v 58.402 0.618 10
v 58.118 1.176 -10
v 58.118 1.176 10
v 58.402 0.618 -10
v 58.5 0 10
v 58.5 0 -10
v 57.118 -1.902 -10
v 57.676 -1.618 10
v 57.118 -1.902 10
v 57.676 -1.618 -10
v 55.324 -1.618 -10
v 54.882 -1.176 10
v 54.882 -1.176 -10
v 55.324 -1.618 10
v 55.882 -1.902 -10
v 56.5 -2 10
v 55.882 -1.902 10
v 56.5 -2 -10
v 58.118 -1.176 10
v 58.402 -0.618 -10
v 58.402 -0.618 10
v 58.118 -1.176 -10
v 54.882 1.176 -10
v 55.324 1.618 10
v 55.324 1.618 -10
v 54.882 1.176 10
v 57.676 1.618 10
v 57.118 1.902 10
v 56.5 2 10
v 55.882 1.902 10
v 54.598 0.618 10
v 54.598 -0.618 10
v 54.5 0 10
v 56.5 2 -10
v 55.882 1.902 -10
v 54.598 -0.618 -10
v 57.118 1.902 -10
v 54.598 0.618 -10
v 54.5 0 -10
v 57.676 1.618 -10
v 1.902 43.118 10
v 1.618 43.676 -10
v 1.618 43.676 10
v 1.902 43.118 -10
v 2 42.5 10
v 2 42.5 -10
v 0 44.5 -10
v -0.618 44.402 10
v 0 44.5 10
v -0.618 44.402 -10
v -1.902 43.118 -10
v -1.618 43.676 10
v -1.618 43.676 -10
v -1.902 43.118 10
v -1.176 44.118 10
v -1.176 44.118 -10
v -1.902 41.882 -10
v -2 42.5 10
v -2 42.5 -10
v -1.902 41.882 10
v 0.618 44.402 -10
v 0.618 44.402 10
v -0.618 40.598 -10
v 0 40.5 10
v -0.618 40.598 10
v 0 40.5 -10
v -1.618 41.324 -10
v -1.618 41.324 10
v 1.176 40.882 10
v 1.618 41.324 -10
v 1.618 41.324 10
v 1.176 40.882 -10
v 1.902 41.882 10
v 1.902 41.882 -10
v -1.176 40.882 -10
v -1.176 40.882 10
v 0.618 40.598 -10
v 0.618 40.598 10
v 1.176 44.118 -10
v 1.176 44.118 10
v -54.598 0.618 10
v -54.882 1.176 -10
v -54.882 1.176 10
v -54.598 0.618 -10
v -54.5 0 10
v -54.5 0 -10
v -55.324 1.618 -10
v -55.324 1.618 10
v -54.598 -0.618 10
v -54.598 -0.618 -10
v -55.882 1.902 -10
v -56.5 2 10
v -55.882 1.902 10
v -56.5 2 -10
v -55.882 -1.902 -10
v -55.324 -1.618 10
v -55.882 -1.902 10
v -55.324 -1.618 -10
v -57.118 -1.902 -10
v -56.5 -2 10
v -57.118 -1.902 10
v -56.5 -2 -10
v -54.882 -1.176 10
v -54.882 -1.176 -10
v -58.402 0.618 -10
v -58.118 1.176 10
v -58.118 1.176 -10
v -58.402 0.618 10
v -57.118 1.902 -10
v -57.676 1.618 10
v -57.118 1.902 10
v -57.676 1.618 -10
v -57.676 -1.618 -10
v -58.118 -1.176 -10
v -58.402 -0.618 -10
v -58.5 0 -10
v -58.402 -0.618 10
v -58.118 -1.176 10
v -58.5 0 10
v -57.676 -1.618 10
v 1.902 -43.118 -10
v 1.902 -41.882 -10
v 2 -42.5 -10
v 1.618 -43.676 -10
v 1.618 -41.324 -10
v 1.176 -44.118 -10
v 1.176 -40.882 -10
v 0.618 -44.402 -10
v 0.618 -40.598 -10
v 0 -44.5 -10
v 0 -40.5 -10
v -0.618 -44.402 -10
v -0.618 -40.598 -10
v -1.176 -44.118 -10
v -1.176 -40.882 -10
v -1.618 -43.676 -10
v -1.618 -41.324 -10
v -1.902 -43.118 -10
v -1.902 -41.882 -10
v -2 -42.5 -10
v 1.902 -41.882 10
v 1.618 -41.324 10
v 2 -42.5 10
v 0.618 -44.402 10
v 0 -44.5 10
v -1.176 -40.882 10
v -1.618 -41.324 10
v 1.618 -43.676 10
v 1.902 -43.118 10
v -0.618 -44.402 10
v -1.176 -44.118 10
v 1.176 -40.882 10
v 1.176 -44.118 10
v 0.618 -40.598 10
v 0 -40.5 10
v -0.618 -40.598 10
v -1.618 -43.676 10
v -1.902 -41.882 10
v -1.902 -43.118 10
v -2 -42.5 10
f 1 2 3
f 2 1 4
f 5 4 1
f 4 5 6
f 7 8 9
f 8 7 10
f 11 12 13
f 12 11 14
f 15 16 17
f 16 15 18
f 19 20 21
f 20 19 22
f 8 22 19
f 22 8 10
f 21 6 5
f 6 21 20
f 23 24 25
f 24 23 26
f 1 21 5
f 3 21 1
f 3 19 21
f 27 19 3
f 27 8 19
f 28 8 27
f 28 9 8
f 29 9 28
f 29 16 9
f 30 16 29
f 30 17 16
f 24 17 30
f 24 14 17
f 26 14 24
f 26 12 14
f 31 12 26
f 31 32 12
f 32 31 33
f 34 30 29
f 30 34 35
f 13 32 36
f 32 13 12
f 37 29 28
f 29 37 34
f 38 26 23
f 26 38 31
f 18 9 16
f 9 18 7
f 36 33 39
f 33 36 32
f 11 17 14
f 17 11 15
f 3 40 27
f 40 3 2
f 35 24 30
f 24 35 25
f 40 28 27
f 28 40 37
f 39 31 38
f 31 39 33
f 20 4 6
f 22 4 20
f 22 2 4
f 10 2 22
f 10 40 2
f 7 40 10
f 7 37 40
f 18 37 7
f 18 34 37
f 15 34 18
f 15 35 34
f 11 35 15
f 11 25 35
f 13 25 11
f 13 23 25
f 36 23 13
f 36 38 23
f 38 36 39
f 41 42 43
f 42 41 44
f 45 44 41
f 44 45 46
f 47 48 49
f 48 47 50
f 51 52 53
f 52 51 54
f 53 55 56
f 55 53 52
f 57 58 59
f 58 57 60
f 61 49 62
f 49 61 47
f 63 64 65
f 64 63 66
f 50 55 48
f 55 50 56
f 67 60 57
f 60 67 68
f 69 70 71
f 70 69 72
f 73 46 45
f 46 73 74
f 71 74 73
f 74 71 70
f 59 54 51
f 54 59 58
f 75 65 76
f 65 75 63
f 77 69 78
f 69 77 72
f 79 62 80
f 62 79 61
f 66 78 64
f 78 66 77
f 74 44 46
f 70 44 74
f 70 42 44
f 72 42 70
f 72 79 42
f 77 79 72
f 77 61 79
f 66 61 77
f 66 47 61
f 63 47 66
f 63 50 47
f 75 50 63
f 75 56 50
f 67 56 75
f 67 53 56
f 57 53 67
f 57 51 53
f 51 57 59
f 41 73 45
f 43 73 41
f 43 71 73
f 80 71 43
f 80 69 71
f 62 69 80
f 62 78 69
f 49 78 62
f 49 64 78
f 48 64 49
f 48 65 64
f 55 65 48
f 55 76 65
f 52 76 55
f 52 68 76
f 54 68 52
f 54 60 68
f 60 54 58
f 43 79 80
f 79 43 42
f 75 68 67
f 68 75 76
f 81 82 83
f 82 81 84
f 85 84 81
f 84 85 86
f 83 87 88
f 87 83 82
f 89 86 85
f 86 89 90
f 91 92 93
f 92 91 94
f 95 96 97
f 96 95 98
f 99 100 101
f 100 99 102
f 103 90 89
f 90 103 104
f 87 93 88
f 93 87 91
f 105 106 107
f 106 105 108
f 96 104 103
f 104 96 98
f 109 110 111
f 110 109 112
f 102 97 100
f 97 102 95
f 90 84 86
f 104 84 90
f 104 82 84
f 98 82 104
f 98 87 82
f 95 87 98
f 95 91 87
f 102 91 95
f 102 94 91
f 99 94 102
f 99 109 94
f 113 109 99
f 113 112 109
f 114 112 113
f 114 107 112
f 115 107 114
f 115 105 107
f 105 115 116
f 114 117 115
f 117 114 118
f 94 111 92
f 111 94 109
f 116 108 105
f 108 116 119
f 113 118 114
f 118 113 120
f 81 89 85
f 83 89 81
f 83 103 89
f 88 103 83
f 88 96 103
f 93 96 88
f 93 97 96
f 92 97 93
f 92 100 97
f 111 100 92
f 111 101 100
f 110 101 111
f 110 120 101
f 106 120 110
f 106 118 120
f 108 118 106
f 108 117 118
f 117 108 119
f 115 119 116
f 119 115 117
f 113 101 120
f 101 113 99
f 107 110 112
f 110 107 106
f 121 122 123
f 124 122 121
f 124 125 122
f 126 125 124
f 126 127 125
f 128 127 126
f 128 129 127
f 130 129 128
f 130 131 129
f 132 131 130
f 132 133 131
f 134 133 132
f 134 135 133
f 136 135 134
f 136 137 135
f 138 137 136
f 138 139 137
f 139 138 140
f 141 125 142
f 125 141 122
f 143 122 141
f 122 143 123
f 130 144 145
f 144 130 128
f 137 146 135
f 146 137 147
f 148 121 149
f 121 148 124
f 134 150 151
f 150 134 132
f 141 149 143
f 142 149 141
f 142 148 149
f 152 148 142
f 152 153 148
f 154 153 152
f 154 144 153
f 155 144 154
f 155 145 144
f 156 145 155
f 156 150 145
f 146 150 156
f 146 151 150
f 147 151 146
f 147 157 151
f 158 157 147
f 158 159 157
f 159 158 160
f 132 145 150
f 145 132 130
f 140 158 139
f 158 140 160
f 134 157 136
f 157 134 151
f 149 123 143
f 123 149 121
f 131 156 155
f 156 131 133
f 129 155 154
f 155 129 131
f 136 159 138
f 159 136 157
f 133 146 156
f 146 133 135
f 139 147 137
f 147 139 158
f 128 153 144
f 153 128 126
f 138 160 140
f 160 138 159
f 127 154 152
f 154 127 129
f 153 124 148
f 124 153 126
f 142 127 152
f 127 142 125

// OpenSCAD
HoleCross(85, 113, 4);

module HoleCross(vertical, horizontal, diameter=3, height=10) {
    translate([horizontal / 2, 0, 0]) Hole(diameter, height);
    translate([0, vertical / 2, 0]) Hole(diameter, height);
    translate([- horizontal / 2, 0,  0]) Hole(diameter, height);
    translate([0, - vertical / 2,  0]) Hole(diameter, height);
}

module Hole(diameter, height) {
    cylinder(h=2*height, d=diameter, center=true, $fn = 20);
}
